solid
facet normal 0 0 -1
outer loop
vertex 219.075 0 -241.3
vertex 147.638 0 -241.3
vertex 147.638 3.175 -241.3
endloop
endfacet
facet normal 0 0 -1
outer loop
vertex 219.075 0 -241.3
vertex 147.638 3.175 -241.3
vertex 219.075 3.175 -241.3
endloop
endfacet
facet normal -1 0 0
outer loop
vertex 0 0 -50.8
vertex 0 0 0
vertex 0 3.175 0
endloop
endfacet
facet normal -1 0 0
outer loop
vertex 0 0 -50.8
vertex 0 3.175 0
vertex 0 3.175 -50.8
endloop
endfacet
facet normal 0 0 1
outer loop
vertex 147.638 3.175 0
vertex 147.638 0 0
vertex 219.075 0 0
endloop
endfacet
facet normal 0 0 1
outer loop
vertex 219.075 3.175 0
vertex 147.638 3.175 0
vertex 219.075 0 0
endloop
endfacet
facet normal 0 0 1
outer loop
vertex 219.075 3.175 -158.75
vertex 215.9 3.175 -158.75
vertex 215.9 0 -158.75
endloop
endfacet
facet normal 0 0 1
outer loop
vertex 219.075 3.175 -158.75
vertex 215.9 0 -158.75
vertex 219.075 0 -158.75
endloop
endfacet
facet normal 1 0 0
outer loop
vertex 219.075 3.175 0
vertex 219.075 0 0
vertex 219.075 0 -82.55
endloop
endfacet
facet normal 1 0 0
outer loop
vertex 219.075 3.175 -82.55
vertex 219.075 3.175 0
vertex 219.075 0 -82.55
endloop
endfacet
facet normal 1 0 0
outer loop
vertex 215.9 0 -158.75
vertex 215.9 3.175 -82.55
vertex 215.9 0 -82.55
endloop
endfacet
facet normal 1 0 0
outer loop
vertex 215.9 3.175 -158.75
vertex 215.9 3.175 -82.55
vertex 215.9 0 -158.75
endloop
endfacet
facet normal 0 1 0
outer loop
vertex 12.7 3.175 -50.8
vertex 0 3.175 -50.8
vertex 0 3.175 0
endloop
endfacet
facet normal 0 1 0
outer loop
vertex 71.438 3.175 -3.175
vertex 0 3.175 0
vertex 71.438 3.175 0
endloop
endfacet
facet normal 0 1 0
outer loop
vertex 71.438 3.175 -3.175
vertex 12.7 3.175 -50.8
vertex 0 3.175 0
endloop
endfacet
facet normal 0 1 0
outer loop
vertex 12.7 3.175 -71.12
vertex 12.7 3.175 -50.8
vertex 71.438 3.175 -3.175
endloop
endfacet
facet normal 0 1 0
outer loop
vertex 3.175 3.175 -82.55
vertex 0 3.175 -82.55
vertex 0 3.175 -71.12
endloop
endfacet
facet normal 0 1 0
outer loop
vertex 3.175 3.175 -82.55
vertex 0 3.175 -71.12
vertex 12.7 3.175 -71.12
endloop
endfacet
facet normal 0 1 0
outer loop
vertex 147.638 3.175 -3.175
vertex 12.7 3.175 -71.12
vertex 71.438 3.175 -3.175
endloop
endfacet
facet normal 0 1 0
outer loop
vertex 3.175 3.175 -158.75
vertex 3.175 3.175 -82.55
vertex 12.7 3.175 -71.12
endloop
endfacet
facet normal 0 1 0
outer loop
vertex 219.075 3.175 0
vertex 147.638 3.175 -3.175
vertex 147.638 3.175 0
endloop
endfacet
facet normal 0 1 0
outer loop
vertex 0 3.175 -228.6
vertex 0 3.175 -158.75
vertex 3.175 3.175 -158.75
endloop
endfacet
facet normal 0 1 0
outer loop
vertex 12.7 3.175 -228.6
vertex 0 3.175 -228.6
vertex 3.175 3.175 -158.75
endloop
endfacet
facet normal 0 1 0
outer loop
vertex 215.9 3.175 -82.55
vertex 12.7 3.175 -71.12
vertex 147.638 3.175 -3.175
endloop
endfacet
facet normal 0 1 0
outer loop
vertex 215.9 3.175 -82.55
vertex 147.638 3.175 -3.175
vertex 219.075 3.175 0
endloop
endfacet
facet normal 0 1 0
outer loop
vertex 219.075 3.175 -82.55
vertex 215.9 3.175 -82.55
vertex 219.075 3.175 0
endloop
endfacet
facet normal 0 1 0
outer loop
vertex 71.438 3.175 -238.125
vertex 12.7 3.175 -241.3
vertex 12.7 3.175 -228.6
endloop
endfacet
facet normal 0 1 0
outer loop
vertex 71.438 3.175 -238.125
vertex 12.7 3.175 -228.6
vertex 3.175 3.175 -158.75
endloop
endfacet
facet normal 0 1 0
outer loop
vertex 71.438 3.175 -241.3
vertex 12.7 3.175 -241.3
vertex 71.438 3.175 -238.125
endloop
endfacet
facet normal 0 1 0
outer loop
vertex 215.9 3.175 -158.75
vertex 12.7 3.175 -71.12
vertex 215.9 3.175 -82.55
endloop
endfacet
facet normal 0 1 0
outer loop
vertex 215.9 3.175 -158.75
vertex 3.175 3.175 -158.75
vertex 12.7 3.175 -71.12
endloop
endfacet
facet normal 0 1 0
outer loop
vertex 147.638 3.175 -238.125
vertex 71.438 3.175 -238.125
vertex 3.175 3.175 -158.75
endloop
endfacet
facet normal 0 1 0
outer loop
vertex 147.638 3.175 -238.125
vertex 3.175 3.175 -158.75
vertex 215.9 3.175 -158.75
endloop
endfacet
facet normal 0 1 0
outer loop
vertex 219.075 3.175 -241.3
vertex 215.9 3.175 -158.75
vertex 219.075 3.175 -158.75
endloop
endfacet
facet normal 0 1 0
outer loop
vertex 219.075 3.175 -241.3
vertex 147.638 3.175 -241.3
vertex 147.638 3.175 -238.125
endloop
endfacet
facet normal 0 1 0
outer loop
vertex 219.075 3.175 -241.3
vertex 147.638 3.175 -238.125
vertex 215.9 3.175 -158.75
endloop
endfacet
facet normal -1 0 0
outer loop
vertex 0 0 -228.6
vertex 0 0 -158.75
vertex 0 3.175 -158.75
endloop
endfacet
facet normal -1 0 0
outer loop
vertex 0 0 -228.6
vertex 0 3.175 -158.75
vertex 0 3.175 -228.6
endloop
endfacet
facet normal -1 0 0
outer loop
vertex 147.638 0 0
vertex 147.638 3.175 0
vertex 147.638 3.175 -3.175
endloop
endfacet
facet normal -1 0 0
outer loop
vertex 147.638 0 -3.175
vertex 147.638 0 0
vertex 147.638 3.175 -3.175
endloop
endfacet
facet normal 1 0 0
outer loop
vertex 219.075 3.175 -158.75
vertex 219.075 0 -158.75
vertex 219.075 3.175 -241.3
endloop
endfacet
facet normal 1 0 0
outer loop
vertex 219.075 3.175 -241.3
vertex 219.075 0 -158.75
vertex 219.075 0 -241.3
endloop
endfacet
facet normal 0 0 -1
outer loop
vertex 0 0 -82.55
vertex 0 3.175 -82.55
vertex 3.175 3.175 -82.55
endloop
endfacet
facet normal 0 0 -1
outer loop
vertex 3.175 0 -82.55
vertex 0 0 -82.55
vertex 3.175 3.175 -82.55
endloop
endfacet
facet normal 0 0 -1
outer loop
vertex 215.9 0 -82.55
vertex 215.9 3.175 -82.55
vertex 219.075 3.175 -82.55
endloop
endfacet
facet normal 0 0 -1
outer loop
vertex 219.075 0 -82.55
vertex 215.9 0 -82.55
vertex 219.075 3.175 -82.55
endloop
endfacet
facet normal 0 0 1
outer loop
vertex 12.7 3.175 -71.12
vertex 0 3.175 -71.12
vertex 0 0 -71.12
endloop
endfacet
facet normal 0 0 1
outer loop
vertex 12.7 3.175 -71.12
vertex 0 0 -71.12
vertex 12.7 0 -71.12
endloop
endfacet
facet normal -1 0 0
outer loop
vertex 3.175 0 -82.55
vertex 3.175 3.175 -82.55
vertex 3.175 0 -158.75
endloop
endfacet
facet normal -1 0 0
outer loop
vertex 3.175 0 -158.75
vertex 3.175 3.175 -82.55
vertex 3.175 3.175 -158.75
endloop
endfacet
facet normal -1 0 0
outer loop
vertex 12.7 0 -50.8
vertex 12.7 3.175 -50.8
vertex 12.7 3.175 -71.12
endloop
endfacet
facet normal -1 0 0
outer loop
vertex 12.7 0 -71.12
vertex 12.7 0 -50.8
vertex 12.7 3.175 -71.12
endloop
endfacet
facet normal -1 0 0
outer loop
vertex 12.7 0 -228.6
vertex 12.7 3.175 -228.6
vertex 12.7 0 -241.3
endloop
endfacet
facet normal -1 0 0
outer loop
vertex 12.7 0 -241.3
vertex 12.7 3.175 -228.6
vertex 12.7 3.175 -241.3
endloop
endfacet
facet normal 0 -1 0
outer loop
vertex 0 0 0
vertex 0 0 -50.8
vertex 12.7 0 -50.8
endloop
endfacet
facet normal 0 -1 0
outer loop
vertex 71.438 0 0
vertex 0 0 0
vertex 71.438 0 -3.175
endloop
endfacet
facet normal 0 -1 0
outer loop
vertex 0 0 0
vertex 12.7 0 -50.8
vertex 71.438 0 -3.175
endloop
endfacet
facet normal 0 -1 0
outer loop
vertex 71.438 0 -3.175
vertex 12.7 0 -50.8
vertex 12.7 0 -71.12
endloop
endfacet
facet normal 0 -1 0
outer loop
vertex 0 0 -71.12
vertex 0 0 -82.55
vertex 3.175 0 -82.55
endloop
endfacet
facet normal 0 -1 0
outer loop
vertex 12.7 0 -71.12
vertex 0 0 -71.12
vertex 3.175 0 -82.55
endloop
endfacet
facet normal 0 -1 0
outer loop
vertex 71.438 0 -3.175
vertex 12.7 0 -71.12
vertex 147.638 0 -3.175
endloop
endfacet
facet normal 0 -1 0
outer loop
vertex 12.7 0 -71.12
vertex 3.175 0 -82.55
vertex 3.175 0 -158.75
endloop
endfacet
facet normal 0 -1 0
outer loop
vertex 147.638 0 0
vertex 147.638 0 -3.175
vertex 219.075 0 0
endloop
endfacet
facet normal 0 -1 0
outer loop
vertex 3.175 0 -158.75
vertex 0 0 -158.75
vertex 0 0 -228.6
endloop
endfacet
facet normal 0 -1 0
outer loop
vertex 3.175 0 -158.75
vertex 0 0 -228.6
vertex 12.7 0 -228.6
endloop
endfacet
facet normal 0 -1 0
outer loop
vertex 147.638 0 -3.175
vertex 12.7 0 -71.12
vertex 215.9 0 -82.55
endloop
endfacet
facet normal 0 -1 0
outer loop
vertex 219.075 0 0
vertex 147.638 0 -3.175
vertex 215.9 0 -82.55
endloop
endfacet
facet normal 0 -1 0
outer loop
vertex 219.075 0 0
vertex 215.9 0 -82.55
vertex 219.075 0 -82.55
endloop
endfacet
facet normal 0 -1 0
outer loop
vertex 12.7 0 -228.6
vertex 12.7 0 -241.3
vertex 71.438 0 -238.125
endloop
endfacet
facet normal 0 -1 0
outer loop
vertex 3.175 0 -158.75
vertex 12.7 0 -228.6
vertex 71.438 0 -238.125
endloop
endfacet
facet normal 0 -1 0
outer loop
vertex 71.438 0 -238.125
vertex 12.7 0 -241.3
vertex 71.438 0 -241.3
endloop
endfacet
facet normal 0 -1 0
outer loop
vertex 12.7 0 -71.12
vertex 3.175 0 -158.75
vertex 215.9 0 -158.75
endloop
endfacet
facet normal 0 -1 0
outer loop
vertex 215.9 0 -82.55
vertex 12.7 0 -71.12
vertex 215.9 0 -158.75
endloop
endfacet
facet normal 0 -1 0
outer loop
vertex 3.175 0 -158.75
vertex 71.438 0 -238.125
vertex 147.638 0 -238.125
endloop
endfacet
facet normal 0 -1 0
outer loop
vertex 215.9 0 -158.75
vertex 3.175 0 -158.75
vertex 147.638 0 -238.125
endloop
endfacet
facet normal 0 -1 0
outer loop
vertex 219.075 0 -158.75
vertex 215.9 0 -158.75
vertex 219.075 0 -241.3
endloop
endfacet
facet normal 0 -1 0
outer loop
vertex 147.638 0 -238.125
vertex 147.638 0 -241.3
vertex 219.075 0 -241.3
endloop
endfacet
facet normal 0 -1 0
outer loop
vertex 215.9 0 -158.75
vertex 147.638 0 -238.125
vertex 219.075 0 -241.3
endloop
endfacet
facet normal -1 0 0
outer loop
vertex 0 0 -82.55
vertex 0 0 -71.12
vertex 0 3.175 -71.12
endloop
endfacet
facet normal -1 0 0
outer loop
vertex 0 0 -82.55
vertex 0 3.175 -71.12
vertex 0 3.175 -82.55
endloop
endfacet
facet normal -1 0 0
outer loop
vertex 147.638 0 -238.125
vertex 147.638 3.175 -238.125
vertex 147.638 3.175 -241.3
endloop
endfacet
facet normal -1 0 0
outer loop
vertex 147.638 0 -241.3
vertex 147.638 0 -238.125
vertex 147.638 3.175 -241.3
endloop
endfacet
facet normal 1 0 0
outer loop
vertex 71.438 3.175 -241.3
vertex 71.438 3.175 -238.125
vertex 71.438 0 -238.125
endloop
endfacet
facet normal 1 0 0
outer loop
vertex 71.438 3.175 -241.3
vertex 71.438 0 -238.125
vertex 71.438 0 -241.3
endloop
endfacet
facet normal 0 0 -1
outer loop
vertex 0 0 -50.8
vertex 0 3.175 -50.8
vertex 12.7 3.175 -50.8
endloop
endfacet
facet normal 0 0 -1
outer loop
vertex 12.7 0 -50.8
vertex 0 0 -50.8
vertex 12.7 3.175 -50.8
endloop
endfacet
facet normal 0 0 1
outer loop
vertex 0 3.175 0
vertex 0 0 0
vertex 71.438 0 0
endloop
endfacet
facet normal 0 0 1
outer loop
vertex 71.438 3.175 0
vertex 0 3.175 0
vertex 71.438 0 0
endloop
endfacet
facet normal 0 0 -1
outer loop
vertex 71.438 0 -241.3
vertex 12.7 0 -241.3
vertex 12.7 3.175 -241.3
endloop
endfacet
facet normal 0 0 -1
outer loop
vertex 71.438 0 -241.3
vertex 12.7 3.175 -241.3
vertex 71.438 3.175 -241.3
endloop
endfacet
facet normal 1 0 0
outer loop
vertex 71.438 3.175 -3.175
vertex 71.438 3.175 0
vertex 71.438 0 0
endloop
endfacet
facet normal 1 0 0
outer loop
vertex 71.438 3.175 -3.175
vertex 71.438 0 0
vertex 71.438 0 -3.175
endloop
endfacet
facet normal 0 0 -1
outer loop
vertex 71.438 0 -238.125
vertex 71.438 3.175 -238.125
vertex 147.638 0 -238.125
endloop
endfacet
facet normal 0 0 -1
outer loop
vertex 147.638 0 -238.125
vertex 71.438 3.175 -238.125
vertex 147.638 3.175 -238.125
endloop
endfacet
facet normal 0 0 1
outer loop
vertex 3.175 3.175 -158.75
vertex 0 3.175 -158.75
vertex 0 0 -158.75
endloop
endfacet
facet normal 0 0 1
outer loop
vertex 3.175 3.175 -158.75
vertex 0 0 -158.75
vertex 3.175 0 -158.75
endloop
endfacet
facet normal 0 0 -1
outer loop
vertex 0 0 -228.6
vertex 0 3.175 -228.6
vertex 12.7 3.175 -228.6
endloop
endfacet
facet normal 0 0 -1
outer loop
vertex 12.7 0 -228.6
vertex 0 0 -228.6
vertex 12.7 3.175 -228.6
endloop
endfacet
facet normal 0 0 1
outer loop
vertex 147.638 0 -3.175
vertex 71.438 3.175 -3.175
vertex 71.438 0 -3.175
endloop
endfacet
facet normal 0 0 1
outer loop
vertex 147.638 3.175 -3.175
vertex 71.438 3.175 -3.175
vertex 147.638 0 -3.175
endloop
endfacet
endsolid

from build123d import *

# Parameters (mm, degrees)
SKETCH2_W           = 219.075
SKETCH2_H           = 241.3
BOSS_EXTRUDE1_DEPTH = 3.175
SKETCH3_W           = 3.175
SKETCH3_H           = 76.2
SKETCH3_W_2         = 76.2
SKETCH3_H_2         = 3.175
CUT_EXTRUDE1_DEPTH  = 4.175
SKETCH4_W           = 12.7
SKETCH4_H           = 20.32
SKETCH4_H_2         = 12.7
CUT_EXTRUDE2_DEPTH  = 4.175


with BuildPart() as part:
    # Sketch2 → Boss-Extrude1 (new body)
    with BuildSketch(Plane(origin=(0, 0, 0), x_dir=(1, 0, 0), z_dir=(0, 1, 0))):
        with Locations((109.5375, 120.65)):
            Rectangle(SKETCH2_W, SKETCH2_H)
    extrude(amount=BOSS_EXTRUDE1_DEPTH)

    # Sketch3 → Cut-Extrude1 (cut, through all)
    with BuildSketch(Plane(origin=(0, 3.175, 0), x_dir=(1, 0, 0), z_dir=(0, 1, 0))):
        with Locations((1.5875, 120.65)):
            Rectangle(SKETCH3_W, SKETCH3_H)
        with Locations((217.4875, 120.65)):
            Rectangle(SKETCH3_W, SKETCH3_H)
        with Locations((109.5375, 239.7125)):
            Rectangle(SKETCH3_W_2, SKETCH3_H_2)
        with Locations((109.5375, 1.5875)):
            Rectangle(SKETCH3_W_2, SKETCH3_H_2)
    extrude(amount=-CUT_EXTRUDE1_DEPTH, mode=Mode.SUBTRACT)

    # Sketch4 → Cut-Extrude2 (cut, through all)
    with BuildSketch(Plane(origin=(0, 3.175, 0), x_dir=(1, 0, 0), z_dir=(0, 1, 0))):
        with Locations((6.35, 60.96)):
            Rectangle(SKETCH4_W, SKETCH4_H)
        with Locations((6.35, 234.95)):
            Rectangle(SKETCH4_W, SKETCH4_H_2)
    extrude(amount=-CUT_EXTRUDE2_DEPTH, mode=Mode.SUBTRACT)


solid = part.part
